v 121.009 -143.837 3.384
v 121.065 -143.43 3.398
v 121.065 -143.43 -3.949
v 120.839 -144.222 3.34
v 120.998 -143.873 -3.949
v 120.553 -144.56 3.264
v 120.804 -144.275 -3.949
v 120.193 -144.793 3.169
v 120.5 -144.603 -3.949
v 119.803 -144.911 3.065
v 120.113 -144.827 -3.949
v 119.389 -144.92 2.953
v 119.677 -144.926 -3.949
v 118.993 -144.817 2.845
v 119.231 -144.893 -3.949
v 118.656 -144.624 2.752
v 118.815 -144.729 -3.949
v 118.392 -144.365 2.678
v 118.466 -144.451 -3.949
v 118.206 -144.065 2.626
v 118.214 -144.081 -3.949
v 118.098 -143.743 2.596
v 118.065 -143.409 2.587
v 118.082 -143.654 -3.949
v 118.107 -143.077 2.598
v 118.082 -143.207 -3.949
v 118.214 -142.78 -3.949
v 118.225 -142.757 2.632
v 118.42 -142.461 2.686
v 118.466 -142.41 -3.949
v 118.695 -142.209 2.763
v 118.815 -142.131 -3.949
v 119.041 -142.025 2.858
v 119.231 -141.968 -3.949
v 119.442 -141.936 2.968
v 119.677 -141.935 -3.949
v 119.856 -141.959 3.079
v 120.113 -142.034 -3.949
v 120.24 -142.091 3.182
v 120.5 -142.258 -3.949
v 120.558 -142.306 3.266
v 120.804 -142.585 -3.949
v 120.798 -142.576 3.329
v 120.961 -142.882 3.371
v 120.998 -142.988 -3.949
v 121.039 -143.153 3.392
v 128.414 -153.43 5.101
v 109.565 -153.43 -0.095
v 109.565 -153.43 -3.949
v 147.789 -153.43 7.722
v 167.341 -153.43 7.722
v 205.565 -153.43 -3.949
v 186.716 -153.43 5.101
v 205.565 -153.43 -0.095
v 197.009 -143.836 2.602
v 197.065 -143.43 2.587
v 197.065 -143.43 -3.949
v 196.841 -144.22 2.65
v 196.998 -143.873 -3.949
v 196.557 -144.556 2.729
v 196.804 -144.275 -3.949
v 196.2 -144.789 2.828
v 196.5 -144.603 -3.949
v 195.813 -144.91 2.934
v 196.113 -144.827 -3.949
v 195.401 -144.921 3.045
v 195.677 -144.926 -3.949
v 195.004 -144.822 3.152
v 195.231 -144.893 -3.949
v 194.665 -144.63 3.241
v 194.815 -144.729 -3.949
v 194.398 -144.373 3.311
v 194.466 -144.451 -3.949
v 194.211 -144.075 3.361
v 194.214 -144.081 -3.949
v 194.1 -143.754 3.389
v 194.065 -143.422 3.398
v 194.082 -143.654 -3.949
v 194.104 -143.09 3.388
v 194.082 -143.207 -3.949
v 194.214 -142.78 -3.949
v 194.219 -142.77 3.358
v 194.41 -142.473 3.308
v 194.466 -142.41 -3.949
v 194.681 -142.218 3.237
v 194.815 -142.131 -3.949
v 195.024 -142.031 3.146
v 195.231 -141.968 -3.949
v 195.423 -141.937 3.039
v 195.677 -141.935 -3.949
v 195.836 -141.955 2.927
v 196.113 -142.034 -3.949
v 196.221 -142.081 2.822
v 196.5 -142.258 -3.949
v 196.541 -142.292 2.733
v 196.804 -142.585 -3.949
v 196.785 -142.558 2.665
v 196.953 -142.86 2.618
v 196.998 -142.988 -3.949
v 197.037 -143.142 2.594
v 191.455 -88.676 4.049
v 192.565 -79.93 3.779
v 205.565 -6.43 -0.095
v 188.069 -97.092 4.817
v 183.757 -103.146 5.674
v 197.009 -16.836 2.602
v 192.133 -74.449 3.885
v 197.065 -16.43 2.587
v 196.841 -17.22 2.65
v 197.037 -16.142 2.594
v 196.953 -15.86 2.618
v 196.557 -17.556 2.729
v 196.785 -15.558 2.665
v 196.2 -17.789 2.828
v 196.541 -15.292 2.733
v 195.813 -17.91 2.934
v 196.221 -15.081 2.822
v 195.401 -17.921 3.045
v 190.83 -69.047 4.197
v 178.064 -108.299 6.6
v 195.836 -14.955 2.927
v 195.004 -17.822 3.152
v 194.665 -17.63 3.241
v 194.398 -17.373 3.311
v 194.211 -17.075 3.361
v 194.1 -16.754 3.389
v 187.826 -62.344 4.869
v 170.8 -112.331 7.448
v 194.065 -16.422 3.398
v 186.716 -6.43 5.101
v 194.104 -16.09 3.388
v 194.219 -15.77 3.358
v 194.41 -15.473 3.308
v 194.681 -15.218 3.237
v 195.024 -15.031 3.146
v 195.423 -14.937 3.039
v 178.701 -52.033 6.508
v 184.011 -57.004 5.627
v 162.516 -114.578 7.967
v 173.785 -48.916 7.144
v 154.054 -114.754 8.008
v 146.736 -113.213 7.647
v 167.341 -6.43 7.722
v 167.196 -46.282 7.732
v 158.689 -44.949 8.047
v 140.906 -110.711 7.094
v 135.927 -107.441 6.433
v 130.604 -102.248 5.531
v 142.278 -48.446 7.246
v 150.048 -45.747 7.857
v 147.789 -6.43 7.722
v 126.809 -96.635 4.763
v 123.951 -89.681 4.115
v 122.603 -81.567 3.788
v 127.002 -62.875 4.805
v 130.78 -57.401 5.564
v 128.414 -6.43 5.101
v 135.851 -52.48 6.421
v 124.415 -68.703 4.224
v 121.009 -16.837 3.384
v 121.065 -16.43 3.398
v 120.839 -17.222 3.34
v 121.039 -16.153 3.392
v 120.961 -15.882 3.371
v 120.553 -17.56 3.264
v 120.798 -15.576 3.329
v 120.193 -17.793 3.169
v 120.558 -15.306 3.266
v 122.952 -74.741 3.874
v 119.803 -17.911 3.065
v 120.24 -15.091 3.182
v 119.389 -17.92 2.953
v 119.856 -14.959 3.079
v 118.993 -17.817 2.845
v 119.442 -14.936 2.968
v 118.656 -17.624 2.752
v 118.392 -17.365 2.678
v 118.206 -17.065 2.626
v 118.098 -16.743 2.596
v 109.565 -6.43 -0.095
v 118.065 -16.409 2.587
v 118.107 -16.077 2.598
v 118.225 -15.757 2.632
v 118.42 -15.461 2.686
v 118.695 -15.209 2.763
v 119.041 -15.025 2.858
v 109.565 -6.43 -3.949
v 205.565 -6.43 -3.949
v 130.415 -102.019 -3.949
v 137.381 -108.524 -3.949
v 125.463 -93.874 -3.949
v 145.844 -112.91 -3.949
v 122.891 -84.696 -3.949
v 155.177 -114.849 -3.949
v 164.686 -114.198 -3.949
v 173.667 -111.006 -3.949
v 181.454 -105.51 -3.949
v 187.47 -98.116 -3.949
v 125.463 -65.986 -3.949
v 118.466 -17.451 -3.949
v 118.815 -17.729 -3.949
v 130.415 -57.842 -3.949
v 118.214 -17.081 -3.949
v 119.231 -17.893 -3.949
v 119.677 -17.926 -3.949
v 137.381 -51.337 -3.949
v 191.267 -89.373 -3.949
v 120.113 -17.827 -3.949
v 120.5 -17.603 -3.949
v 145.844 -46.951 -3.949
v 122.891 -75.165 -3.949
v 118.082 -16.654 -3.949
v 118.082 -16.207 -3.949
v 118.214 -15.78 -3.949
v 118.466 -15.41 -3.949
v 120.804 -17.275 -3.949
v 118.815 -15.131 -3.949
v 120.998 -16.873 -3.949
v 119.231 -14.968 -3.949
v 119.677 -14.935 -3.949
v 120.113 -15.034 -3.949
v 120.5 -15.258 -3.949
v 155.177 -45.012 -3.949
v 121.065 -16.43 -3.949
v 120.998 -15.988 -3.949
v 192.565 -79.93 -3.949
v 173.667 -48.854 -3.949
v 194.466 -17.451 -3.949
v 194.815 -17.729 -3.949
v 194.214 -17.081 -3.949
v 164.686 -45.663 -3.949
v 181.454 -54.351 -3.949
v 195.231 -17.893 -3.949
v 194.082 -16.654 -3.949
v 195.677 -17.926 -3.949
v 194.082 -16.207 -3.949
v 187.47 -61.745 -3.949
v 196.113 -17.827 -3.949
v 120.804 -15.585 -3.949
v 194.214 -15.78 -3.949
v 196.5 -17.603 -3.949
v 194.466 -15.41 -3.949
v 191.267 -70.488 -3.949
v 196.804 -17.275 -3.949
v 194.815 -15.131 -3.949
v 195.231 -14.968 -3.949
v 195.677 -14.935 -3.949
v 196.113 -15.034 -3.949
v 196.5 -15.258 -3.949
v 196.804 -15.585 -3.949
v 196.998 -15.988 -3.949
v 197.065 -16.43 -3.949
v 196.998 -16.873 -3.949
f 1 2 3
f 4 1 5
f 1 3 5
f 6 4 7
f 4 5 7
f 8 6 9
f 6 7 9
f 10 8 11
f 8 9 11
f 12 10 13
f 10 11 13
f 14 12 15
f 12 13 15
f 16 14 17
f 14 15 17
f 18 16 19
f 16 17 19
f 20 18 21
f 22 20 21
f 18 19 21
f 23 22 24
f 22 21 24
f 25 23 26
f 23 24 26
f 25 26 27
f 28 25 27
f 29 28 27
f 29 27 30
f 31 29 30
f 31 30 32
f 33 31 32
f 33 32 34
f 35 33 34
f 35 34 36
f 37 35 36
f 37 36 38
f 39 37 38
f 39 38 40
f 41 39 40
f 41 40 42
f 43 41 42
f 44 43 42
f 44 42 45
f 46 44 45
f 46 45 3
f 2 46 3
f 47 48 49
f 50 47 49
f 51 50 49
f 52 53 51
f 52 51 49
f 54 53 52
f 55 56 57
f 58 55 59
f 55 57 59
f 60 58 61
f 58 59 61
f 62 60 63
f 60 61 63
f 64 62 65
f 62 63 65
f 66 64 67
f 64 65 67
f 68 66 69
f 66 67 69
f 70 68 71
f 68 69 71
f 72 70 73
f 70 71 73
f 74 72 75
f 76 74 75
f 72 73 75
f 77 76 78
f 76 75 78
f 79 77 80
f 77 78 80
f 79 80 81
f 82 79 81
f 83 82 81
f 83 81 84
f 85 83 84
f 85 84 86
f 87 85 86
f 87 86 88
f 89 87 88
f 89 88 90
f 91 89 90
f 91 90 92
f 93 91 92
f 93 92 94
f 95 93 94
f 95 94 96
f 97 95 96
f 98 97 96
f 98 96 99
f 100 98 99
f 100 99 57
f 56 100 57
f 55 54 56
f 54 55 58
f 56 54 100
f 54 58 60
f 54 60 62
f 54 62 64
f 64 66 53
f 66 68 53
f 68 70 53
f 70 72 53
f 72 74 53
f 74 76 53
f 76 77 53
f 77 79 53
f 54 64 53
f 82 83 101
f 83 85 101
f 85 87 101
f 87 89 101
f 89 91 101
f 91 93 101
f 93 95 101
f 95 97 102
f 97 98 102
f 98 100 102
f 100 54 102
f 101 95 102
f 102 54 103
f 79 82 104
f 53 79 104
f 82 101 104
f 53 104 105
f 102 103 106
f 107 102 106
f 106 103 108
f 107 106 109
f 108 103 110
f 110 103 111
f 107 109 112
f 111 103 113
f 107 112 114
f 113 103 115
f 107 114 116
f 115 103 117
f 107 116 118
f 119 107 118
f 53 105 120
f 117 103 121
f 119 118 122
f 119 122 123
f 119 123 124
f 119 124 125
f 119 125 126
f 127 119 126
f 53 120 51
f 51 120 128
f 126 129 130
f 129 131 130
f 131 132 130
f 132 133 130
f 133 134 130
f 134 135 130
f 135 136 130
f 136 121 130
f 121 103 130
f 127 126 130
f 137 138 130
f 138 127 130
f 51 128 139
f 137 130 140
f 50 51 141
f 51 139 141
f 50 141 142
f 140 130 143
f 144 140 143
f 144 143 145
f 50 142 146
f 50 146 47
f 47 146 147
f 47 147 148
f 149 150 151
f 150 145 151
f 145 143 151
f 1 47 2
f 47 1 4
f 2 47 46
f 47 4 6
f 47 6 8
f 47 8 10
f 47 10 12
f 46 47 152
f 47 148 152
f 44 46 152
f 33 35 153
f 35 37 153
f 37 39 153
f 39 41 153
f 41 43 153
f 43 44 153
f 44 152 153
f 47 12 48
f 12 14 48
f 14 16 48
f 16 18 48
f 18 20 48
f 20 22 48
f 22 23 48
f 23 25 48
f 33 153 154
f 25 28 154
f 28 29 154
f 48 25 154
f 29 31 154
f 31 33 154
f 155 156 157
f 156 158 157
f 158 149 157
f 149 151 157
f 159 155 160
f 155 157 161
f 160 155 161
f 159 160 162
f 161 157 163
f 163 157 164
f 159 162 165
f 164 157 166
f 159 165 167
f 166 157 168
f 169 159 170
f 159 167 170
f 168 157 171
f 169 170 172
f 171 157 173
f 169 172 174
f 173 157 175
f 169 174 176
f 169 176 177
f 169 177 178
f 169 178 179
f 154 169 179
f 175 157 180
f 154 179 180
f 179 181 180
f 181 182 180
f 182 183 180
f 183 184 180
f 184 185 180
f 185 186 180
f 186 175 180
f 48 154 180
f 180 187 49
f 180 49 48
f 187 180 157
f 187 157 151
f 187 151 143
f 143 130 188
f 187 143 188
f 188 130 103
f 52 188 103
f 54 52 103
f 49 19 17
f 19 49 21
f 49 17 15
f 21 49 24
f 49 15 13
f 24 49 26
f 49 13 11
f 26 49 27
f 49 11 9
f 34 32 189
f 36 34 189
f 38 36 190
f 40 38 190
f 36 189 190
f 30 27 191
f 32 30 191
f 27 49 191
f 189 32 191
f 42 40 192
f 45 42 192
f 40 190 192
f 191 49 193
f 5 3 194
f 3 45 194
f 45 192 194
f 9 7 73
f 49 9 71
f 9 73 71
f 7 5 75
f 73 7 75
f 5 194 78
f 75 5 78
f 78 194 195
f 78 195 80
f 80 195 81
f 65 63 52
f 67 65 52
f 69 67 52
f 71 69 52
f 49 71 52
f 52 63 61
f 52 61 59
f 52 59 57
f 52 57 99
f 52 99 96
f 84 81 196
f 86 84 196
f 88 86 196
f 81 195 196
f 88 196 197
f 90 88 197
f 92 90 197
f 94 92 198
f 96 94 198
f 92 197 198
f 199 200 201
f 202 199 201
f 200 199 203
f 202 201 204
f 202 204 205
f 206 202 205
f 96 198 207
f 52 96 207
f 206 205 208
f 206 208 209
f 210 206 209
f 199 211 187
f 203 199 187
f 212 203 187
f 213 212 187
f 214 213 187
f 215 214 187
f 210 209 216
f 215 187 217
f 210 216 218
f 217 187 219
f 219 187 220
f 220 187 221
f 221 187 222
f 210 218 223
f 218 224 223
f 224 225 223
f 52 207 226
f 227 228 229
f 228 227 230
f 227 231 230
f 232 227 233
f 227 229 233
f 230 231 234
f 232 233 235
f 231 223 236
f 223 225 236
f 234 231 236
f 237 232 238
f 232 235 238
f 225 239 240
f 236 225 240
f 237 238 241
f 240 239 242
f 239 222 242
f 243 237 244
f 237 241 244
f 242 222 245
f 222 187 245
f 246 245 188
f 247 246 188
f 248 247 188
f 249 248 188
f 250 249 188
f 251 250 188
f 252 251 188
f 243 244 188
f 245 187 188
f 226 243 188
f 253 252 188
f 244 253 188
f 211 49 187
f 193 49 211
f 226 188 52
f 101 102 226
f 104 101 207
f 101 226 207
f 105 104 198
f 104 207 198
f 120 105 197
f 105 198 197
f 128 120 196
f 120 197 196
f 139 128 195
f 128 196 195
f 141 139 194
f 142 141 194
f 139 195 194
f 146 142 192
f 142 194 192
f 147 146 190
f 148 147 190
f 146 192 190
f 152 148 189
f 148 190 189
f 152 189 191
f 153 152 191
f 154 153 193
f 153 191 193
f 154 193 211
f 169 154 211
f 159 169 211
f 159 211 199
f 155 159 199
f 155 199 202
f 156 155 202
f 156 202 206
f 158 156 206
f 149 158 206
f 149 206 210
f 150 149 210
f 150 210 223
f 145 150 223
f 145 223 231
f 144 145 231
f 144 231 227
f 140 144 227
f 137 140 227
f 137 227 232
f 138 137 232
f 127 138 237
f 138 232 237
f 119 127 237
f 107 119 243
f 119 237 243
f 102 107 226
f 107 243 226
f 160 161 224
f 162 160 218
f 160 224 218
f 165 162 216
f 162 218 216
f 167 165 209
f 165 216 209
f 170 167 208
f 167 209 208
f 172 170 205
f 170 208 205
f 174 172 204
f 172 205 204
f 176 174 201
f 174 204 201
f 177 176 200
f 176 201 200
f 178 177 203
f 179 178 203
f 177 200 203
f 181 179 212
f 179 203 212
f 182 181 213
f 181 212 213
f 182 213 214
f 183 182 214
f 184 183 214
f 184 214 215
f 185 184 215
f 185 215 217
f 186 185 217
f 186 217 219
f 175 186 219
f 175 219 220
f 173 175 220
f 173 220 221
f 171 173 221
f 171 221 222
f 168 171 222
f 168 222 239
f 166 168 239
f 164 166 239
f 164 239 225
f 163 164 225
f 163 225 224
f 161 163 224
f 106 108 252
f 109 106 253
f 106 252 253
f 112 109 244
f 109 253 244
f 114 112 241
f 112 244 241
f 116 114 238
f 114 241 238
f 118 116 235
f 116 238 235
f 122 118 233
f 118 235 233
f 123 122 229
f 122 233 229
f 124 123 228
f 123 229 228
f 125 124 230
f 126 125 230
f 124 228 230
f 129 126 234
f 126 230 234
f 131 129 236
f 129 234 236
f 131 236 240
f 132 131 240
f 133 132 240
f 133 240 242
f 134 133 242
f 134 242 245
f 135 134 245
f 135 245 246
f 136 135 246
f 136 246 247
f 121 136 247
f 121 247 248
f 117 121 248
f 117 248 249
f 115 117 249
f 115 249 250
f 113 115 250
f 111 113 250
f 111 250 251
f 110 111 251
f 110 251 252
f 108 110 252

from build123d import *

# Parameters (mm, degrees)
PAD008_DEPTH    = 147
SKETCH029_R     = 35
POCKET004_DEPTH = 12.001
SKETCH049_R     = 1.5
POCKET013_DEPTH = 12.001


with BuildPart() as part:
    # Sketch028 → Pad008 (new body)
    with BuildSketch(Plane.XZ):
        with BuildLine():
            Line((-327.151421, 0), (-231.151421, 0))
            Line((-231.151421, 0), (-231.151421, 3.854468))
            ThreePointArc((-231.151421, 3.854468), (-279.151421, 12), (-327.151421, 3.854468))
            Line((-327.151421, 0), (-327.151421, 3.854468))
        make_face()
    extrude(amount=PAD008_DEPTH)

    # Sketch029 (on DatumPlane) → Pocket004 (cut, through all)
    with BuildSketch(Plane(origin=(0, 0, 0), x_dir=(1, 0, 0), z_dir=(0, 0, -1))):
        with Locations((-279.151421, 73.5)):
            Circle(SKETCH029_R)
    extrude(amount=-POCKET004_DEPTH, mode=Mode.SUBTRACT)

    # Sketch049 (on Face1 of Pocket004) → Pocket013 (cut, through all)
    with BuildSketch(Plane(origin=(0, 0, 0), x_dir=(1, 0, 0), z_dir=(0, 0, -1))):
        with Locations((-317.151421, 137)):
            Circle(SKETCH049_R)
        with Locations((-241.151421, 137)):
            Circle(SKETCH049_R)
        with Locations((-317.151421, 10)):
            Circle(SKETCH049_R)
        with Locations((-241.151421, 10)):
            Circle(SKETCH049_R)
    extrude(amount=-POCKET013_DEPTH, mode=Mode.SUBTRACT)


with BuildPart() as part_1:
    # Body006 placement: moved
    add(part.part.moved(Location((436.71651, -6.430456, -3.949142))))


solid = part_1.part
